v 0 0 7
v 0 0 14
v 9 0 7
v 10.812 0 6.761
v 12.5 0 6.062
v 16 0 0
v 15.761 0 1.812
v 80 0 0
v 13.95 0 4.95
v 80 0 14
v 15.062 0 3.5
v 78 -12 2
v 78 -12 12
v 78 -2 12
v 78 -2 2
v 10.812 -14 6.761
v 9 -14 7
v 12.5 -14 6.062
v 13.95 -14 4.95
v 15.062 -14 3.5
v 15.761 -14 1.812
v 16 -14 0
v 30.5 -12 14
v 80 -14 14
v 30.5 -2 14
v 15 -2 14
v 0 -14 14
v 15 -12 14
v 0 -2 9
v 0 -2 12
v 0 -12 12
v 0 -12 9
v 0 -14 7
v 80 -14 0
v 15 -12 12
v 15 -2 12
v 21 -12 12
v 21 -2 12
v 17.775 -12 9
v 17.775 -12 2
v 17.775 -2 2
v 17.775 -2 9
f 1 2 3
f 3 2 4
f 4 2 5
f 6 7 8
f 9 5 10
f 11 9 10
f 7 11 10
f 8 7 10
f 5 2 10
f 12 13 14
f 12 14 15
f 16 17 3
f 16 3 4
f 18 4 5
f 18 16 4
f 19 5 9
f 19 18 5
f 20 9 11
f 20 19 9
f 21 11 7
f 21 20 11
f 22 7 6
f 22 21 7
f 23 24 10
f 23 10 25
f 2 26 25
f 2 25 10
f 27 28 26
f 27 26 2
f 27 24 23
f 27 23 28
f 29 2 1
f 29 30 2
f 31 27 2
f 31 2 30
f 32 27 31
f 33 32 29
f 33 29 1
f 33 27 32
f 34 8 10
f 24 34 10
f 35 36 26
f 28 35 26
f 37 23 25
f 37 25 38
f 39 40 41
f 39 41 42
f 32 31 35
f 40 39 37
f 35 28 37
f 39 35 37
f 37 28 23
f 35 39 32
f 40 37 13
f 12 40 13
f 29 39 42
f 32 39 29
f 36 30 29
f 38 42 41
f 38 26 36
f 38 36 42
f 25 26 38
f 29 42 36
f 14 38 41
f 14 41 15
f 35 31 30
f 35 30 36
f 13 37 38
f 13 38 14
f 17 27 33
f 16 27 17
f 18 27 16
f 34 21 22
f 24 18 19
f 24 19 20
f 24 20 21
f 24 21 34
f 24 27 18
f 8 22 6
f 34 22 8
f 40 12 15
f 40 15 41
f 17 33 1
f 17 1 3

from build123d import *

# Parameters (mm, degrees)
F1_DEPTH = 2
F2_W     = 15
F2_H     = 2
F3_DEPTH = 5


with BuildPart() as f1:
    # F0 (on Front) → F1 (new body)
    with BuildSketch(Plane.XZ):
        with BuildLine():
            ThreePointArc((9, 7), (13.9497474683, 4.9497474683), (16, 0))
            Line((16, 0), (80, 0))
            Line((80, 0), (80, 14))
            Line((80, 14), (0, 14))
            Line((0, 14), (0, 7))
            Line((0, 7), (9, 7))
        make_face()
    extrude(amount=F1_DEPTH)

    # F2 (on face) → F3 (join)
    with BuildSketch(Plane.XZ.offset(2)):
        with BuildLine():
            Line((17.7749643874, 9), (0, 9))
            Line((0, 9), (0, 7))
            Line((0, 7), (9, 7))
            ThreePointArc((9, 7), (13.9497474683, 4.9497474683), (16, 0))
            Line((16, 0), (80, 0))
            Line((80, 0), (80, 14))
            Line((80, 14), (30.5, 14))
            Line((30.5, 14), (21, 12))
            Line((21, 12), (78, 12))
            Line((78, 12), (78, 2))
            Line((78, 2), (17.7749643874, 2))
            Line((17.7749643874, 2), (17.7749643874, 9))
        make_face()
        with Locations((7.5, 13)):
            Rectangle(F2_W, F2_H)
    extrude(amount=F3_DEPTH)

    # F4: F1 across face


with BuildPart() as f1_1:
    add(f1.part)
    add(f1.part.mirror(Plane(origin=(45.1805632689, -7, 6.6042722169), x_dir=(1, 0, 0), z_dir=(0, -1, 0))))


solid = f1_1.part
